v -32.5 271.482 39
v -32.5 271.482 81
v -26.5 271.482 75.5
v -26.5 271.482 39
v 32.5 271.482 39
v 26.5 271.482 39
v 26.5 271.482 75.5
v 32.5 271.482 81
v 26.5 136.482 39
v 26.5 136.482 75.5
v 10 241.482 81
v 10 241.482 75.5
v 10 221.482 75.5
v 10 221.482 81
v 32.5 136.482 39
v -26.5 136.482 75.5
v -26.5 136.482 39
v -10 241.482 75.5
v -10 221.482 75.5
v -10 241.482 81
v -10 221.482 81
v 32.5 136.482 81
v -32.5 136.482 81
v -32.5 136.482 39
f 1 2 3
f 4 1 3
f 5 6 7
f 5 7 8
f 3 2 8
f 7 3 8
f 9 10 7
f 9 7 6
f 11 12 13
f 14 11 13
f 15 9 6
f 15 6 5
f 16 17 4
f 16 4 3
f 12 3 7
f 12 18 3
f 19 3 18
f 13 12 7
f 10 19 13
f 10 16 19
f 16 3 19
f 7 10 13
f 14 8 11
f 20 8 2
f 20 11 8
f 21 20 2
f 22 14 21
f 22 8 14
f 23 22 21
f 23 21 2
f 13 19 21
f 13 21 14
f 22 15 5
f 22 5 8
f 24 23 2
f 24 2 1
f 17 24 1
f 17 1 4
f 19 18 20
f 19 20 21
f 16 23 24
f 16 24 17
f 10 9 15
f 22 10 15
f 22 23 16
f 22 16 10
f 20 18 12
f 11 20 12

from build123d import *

# Parameters (mm, degrees)
SKETCH006_W      = 20
SKETCH006_H      = 20
EXTRUDE009_DEPTH = 15
EXTRUDE007_DEPTH = 135


with BuildPart() as extrude009:
    # Sketch006 (on Face2 of Extrude007) → Extrude009 (new body, symmetric)
    with BuildSketch(Plane(origin=(0, 0, 39), x_dir=(1, 0, 0), z_dir=(0, 0, -1))):
        with Locations((0, -231.482224)):
            Rectangle(SKETCH006_W, SKETCH006_H)
    extrude(amount=EXTRUDE009_DEPTH, both=True)


with BuildPart() as extrude009_1:
    # Extrude009 placement: moved
    add(extrude009.part.moved(Location((0, 0, 39))))


with BuildPart() as u067:
    # Sketch009 (on Face6 of Extrude006) → Extrude007 (new body)
    with BuildSketch(Plane(origin=(0, 136.482224, 0), x_dir=(-1, 0, 0), z_dir=(0, 1, 0))):
        Polygon((-32.5, 39), (-32.5, 81), (32.5, 81), (32.5, 39), (26.5, 39), (26.5, 75.5), (-26.5, 75.5), (-26.5, 39), align=None)
    extrude(amount=EXTRUDE007_DEPTH)

    # Cut002: cut Extrude009
    add(extrude009_1.part, mode=Mode.SUBTRACT)


solid = u067.part
